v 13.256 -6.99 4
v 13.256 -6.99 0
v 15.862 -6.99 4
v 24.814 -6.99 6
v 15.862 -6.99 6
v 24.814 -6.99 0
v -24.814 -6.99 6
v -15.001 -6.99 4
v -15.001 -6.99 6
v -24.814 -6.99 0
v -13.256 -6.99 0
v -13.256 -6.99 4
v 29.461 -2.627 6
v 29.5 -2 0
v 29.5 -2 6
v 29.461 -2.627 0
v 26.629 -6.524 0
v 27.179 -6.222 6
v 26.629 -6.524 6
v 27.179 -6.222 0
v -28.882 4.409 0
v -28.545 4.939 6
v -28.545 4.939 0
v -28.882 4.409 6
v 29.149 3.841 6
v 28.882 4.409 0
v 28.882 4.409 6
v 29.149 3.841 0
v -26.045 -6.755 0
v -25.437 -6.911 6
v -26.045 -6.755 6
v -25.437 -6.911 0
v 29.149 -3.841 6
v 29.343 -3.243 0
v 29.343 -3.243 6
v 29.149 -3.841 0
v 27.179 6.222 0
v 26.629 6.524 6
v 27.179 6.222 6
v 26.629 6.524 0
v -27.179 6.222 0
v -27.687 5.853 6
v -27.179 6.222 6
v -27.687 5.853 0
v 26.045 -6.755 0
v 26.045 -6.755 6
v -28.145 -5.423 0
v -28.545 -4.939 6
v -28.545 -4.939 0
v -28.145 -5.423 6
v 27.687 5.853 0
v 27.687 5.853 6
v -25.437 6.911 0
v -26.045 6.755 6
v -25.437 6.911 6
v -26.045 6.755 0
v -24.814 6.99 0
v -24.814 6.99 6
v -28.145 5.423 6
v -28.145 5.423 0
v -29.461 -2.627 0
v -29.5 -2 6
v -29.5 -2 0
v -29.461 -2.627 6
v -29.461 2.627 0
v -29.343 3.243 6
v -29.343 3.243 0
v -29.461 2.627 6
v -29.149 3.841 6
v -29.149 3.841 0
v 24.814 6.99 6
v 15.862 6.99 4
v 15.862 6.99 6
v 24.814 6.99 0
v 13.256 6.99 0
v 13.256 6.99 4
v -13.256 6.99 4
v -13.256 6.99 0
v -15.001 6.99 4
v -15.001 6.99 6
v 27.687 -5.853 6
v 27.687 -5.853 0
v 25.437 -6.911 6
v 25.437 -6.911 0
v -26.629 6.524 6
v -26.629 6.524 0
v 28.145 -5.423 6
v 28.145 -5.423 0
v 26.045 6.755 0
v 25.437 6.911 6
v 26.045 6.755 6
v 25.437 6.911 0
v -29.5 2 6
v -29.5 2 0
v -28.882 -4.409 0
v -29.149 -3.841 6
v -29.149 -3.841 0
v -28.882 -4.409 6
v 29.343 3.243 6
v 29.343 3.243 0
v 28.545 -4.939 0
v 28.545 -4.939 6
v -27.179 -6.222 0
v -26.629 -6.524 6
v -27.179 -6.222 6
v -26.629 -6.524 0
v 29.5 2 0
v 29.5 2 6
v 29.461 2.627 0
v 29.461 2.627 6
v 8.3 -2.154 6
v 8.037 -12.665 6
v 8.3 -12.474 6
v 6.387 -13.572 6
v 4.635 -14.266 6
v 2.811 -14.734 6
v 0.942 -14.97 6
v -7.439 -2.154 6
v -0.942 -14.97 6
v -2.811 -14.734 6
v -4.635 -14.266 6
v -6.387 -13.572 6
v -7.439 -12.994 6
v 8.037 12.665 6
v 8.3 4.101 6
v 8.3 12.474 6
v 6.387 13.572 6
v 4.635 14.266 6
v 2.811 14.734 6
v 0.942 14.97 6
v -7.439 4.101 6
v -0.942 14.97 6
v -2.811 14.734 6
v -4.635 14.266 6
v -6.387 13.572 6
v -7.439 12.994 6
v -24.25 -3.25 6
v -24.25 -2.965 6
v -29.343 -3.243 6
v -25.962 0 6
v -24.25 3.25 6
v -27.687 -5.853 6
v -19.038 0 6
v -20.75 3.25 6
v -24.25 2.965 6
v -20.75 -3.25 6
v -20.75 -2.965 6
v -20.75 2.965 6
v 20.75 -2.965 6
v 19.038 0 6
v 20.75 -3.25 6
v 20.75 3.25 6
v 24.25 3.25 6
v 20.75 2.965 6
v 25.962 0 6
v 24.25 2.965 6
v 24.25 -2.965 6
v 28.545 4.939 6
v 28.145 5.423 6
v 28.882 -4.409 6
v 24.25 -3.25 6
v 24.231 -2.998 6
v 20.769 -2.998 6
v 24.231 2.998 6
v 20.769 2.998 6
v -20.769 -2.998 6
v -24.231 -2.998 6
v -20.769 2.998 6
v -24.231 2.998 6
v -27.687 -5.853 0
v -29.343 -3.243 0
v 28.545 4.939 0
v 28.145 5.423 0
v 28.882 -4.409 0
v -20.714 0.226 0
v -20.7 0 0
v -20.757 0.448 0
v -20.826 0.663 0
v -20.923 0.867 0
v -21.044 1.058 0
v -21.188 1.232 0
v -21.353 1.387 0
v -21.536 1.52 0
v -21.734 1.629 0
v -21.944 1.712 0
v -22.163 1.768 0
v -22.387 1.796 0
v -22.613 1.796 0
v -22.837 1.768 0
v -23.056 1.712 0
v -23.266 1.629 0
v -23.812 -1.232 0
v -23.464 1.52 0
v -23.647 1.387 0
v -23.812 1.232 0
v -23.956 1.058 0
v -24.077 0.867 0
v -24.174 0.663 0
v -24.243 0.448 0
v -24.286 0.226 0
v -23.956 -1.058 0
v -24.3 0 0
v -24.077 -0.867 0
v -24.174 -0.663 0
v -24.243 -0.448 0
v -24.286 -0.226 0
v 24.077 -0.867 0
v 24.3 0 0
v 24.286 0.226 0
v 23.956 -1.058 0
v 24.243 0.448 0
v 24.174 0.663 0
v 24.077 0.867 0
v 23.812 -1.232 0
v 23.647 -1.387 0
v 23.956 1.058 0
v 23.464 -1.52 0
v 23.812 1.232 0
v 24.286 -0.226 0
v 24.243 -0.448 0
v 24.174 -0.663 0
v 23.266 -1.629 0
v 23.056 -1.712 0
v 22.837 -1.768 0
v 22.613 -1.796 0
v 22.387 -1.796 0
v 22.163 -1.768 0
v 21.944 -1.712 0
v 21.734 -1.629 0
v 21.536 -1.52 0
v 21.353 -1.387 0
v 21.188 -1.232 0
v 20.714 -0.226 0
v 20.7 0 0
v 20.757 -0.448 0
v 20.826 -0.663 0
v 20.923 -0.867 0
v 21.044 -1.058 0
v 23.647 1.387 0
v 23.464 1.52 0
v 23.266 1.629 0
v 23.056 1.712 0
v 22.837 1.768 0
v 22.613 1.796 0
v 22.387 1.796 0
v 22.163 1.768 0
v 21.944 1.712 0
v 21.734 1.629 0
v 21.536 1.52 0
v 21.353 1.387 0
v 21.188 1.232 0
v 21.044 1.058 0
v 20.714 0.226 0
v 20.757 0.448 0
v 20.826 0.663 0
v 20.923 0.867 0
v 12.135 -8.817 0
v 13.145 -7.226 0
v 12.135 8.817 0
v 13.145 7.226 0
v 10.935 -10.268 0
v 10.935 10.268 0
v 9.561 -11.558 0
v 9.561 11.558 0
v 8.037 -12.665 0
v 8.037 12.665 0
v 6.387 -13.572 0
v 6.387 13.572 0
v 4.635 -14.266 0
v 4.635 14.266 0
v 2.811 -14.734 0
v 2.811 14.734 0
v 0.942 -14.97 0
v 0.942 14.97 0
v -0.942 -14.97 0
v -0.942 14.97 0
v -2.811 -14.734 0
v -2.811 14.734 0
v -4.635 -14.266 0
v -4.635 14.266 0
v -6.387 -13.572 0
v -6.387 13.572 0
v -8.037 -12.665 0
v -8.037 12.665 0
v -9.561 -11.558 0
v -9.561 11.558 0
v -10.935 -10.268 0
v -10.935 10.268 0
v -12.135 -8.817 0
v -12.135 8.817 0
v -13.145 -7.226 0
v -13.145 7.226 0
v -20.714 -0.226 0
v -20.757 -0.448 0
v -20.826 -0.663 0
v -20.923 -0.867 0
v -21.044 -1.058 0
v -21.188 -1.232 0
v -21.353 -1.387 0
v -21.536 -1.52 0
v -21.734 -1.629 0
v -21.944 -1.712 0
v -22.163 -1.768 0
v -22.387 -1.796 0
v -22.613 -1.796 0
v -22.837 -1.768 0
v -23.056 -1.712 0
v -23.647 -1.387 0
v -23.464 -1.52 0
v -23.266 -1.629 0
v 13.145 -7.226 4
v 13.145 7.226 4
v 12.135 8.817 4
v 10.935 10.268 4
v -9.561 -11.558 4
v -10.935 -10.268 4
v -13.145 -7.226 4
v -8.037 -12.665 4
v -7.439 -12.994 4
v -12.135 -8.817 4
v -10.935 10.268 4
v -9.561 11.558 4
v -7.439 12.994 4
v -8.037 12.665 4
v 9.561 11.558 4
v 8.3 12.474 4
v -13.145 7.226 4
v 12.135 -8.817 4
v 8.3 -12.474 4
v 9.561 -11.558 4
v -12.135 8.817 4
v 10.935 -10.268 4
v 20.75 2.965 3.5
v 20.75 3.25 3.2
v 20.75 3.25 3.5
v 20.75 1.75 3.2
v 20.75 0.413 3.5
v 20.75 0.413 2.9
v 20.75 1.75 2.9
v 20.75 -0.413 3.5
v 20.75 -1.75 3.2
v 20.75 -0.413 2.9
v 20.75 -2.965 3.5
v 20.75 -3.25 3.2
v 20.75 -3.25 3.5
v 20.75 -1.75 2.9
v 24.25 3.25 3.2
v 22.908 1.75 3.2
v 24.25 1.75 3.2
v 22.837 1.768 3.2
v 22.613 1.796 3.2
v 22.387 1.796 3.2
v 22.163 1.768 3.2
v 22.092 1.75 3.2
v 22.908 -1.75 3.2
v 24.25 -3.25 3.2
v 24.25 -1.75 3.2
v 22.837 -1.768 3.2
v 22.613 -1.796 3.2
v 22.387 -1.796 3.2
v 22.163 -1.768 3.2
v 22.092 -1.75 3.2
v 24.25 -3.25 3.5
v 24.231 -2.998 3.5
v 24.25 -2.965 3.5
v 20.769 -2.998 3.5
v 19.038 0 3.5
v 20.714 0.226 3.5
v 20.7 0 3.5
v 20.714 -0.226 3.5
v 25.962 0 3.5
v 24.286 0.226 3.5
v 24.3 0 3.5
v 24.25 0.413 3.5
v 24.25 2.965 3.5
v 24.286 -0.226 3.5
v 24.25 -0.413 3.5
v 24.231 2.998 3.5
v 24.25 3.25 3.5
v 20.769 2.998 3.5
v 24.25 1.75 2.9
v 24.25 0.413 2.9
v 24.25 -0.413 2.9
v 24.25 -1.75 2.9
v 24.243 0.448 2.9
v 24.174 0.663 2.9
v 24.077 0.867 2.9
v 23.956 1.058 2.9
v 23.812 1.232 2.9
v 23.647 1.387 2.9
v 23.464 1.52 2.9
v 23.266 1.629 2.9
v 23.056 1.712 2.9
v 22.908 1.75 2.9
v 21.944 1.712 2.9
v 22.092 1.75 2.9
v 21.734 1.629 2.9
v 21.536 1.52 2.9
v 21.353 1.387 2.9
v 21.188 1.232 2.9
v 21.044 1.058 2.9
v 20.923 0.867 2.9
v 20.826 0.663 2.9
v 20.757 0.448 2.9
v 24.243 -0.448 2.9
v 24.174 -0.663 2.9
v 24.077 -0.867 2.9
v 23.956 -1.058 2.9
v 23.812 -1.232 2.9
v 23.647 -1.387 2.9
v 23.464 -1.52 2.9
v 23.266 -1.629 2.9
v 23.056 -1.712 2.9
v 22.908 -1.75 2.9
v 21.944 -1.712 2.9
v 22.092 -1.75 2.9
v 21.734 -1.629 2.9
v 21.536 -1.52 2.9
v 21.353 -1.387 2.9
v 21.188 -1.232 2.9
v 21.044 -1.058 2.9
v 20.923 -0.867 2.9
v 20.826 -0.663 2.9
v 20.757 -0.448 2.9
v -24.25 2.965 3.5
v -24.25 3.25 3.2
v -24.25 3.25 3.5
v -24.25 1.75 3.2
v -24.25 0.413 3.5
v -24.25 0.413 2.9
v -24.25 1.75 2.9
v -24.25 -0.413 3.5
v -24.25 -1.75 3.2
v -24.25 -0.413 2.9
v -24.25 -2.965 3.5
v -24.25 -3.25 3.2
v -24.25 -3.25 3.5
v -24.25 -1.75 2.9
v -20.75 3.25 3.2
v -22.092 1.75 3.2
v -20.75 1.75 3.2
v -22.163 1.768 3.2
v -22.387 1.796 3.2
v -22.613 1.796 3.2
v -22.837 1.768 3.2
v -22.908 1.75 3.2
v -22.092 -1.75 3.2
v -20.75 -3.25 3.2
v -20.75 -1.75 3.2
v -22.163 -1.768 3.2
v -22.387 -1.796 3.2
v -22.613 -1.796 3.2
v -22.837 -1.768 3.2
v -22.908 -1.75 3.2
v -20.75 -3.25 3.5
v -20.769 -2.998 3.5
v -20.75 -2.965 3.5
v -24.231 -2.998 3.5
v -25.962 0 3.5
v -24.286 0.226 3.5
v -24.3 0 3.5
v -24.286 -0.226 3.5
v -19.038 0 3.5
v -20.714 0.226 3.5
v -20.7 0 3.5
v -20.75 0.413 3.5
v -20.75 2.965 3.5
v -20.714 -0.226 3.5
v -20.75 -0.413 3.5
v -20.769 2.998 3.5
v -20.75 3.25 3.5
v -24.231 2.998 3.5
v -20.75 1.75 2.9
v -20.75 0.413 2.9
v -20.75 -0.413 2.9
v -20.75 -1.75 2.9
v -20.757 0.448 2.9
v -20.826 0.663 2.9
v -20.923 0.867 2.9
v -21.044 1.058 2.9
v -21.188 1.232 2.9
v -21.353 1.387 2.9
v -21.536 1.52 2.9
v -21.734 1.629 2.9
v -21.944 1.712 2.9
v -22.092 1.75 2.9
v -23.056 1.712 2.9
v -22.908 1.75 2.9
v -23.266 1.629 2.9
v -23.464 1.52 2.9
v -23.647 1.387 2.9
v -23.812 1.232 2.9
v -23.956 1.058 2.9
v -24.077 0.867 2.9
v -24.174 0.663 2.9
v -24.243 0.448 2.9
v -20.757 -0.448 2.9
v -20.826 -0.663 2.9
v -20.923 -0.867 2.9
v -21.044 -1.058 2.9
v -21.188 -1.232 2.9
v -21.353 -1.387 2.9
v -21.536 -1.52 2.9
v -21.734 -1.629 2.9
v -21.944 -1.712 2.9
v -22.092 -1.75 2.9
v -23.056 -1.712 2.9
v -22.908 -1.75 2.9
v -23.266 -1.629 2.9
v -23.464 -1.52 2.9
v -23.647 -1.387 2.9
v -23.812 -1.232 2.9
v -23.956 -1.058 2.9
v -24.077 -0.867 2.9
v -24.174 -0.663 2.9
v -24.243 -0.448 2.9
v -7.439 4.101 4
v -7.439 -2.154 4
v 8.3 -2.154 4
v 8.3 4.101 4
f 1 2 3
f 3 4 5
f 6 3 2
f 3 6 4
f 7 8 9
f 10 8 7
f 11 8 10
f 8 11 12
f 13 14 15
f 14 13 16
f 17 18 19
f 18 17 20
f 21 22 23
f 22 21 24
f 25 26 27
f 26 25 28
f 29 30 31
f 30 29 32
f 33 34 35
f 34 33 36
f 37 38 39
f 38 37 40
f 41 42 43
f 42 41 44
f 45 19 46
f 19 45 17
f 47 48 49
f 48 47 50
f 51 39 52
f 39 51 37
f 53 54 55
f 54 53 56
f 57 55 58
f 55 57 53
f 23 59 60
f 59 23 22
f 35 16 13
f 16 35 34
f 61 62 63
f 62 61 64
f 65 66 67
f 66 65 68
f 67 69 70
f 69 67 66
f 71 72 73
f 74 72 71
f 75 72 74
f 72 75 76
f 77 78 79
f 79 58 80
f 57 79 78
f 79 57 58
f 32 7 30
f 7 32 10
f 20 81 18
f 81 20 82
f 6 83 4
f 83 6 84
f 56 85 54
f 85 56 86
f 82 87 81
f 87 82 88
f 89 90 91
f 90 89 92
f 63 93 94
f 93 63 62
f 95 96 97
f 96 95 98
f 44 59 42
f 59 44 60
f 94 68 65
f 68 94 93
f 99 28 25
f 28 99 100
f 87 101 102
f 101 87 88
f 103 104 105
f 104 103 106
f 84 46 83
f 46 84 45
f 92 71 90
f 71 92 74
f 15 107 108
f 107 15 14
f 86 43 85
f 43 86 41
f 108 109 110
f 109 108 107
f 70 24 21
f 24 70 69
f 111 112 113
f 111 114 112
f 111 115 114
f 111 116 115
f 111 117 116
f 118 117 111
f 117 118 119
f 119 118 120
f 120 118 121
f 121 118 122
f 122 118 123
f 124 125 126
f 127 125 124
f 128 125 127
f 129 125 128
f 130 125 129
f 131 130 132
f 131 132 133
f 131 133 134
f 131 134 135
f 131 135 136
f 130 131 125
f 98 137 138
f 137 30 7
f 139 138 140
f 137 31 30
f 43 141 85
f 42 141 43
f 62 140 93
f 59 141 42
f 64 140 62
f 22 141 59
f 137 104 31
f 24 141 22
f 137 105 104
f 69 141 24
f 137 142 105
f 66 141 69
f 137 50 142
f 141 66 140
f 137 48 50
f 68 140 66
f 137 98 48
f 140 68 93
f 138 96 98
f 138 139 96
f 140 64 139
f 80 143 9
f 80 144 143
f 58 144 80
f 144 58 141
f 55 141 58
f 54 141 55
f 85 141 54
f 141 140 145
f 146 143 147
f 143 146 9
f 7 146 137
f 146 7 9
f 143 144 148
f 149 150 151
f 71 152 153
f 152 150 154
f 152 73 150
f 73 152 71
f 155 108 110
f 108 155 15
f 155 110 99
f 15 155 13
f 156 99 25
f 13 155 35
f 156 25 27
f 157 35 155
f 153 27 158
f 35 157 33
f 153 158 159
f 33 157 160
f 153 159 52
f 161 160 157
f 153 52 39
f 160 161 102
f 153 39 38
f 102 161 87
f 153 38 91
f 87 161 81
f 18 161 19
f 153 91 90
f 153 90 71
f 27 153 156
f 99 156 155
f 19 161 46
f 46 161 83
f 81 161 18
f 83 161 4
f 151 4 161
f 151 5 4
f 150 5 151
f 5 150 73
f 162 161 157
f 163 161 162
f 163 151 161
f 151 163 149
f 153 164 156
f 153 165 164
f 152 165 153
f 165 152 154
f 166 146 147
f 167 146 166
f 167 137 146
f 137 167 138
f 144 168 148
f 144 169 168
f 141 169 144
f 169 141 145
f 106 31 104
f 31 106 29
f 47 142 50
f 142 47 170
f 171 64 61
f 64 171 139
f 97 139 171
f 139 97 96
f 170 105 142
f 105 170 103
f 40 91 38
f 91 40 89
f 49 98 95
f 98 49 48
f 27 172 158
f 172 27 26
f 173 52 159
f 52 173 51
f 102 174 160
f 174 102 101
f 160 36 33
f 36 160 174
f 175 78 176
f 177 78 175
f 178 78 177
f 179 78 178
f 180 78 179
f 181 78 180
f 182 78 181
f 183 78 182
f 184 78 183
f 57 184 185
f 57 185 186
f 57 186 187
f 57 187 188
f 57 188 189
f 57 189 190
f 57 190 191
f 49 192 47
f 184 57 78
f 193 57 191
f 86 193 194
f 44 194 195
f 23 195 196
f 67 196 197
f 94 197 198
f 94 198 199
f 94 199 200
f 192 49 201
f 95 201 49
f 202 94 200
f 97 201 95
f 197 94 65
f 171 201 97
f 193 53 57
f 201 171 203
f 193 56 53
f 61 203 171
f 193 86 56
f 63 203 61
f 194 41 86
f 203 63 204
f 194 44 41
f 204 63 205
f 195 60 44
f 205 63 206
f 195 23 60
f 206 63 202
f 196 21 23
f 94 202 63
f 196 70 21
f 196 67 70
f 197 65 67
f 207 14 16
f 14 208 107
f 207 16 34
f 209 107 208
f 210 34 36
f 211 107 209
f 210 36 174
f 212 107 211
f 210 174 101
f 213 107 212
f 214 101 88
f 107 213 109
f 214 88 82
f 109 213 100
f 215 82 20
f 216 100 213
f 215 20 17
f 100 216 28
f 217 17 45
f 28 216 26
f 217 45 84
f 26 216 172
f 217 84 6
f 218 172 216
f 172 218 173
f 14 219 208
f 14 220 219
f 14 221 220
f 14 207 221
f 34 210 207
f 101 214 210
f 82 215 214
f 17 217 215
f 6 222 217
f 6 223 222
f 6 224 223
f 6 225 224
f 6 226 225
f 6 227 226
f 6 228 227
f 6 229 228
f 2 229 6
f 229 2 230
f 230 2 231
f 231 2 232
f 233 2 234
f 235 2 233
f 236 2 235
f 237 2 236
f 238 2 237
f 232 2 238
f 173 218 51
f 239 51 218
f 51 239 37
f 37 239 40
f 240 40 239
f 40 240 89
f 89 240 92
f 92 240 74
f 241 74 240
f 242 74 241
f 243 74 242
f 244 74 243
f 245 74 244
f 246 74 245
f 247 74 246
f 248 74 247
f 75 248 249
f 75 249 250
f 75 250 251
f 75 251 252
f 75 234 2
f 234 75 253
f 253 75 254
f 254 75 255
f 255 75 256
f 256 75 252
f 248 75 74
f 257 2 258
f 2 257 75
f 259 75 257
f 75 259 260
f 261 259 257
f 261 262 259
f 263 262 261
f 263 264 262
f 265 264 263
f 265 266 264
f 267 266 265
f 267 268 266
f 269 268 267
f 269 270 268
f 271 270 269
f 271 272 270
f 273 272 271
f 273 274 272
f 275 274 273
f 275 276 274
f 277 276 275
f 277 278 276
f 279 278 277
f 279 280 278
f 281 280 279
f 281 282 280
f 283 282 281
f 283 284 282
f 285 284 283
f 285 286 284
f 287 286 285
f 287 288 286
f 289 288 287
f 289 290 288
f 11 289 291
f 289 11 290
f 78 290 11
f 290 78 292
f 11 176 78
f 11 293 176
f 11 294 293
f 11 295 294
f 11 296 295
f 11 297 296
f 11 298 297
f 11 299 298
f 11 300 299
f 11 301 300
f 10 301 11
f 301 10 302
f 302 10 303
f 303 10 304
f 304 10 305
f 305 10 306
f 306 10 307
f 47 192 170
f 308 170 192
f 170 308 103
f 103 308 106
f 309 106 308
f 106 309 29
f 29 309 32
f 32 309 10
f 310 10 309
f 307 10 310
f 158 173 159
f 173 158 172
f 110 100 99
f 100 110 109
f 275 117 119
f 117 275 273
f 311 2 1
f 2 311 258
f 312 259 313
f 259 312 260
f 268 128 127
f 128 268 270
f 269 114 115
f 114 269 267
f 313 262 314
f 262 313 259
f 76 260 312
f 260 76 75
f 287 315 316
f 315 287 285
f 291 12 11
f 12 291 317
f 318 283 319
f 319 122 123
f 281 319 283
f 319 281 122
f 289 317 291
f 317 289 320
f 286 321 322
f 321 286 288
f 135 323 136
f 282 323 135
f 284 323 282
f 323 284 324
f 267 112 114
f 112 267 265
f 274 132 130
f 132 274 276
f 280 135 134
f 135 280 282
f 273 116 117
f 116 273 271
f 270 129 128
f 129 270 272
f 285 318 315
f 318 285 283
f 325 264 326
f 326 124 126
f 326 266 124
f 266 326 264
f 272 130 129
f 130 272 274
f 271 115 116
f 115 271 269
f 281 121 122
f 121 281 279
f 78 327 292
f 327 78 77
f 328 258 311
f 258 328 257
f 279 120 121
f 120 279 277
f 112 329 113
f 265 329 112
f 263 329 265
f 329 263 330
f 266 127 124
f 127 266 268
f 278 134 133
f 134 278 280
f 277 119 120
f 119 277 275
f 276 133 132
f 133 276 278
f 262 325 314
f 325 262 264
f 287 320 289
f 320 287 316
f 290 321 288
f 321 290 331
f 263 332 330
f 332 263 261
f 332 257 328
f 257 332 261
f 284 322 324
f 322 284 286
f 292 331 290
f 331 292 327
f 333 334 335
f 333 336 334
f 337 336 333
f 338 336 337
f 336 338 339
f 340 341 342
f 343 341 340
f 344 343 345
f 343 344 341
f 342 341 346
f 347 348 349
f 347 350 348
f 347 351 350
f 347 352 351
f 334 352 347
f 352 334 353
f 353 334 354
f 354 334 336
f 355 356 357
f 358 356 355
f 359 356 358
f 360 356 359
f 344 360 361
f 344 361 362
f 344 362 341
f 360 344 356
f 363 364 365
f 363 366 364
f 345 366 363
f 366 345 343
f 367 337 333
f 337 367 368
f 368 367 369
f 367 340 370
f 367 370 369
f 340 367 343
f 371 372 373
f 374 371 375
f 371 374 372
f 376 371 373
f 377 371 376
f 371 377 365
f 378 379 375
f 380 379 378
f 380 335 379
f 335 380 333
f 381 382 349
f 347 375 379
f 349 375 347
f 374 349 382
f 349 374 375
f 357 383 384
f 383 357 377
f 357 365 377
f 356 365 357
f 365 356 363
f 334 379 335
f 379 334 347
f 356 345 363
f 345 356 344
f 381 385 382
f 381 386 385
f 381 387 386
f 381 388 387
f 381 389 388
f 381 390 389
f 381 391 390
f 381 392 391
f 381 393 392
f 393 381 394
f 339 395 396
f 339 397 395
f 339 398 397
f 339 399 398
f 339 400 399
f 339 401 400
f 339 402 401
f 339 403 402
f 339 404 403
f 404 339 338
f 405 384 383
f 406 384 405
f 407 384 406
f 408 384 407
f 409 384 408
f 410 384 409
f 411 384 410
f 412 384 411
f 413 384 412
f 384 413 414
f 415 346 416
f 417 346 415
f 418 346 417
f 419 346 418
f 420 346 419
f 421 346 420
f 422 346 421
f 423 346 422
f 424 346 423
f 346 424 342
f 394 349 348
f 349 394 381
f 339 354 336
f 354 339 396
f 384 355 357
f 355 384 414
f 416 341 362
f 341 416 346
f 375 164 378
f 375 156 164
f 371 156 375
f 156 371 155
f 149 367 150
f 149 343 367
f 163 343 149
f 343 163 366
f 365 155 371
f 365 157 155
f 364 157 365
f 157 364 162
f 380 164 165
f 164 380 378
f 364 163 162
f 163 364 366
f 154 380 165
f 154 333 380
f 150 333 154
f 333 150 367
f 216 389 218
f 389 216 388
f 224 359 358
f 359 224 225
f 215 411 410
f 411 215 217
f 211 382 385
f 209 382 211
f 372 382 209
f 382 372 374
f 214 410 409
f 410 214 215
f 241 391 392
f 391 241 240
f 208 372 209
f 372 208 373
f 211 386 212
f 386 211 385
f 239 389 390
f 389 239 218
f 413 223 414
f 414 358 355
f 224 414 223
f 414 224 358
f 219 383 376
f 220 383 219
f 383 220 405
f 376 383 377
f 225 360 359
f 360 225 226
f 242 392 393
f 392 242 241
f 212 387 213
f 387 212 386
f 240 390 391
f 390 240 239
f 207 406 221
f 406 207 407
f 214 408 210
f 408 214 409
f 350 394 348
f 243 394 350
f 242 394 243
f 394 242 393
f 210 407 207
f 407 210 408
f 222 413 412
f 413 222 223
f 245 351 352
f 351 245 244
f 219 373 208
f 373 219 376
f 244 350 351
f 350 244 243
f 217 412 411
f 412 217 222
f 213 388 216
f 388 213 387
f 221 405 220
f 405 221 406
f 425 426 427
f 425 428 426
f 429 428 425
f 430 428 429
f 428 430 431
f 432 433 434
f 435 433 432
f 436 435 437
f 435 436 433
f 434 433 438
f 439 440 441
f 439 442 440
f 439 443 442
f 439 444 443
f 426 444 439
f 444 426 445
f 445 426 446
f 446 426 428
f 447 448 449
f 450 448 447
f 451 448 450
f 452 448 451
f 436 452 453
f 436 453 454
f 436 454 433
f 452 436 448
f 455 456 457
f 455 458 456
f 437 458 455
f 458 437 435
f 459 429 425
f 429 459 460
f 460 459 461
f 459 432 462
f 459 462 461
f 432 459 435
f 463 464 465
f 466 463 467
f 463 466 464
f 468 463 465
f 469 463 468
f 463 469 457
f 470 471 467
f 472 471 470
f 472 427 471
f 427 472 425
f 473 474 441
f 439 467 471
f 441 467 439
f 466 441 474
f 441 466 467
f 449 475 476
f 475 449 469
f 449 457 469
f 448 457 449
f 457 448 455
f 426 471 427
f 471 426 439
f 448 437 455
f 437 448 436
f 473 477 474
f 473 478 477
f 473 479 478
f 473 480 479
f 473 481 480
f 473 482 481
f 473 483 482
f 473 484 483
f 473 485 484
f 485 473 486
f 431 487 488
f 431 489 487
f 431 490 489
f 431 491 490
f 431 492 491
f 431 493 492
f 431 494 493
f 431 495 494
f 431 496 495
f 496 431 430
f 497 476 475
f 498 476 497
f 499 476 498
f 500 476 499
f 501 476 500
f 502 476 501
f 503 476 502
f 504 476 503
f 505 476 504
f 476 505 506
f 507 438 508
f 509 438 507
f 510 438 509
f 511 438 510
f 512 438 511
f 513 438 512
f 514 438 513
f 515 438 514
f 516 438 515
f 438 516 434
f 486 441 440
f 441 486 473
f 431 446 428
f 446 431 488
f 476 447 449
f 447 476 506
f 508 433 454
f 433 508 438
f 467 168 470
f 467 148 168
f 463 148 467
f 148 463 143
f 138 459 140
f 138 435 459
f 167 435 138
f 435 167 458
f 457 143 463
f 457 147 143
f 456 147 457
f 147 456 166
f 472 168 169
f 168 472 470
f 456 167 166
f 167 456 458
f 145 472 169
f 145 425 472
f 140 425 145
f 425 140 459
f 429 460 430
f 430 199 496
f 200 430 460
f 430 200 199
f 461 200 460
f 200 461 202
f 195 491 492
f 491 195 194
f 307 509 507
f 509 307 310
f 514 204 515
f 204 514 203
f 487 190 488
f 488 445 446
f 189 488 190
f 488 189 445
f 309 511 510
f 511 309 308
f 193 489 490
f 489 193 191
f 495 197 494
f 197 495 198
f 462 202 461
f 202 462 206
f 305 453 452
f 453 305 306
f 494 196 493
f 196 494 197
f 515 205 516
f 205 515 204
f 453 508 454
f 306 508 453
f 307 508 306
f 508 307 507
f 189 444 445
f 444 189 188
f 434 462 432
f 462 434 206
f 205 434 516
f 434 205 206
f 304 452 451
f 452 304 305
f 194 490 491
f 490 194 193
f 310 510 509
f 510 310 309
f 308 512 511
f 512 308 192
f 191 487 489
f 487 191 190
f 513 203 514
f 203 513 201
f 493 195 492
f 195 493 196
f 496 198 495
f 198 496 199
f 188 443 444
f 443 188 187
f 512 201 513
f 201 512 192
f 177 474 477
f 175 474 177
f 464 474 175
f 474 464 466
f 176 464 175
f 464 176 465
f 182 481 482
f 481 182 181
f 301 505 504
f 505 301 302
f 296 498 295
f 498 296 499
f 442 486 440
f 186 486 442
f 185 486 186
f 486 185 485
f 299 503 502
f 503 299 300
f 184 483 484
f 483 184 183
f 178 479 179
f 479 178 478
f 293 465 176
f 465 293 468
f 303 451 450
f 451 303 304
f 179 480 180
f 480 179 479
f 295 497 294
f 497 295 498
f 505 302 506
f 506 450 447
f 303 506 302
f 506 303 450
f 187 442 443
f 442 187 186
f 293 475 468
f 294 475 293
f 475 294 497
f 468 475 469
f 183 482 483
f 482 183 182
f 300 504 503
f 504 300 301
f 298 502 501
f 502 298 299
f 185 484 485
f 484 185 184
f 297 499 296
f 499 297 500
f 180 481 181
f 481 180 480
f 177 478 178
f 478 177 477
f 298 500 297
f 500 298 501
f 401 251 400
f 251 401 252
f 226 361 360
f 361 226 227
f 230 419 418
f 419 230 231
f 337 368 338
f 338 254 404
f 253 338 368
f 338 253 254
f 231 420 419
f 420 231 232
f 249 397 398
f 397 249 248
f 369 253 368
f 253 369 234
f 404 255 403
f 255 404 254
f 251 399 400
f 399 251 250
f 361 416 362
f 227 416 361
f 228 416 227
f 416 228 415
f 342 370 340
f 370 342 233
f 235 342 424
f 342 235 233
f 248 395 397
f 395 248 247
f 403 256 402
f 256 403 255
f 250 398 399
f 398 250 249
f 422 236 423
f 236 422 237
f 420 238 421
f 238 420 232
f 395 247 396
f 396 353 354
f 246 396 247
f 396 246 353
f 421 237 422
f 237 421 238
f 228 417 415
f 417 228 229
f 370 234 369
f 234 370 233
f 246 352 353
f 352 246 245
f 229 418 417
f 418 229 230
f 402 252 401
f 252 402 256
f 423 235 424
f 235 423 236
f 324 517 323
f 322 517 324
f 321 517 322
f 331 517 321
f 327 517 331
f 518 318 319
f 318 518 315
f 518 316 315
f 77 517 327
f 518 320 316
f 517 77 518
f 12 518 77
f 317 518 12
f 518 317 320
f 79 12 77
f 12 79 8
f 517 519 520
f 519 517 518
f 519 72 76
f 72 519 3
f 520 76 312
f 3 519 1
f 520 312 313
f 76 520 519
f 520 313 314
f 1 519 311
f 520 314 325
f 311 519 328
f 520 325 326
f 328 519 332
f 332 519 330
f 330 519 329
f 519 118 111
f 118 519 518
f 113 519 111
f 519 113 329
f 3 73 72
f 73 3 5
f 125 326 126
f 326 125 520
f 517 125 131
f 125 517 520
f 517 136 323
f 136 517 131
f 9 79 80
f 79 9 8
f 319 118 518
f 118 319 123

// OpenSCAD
$fn = 50;


difference() {
	union() {
		hull() {
			translate(v = [-24.5000000000, 2.0000000000, 0]) {
				cylinder(h = 6, r = 5);
			}
			translate(v = [24.5000000000, 2.0000000000, 0]) {
				cylinder(h = 6, r = 5);
			}
			translate(v = [-24.5000000000, -2.0000000000, 0]) {
				cylinder(h = 6, r = 5);
			}
			translate(v = [24.5000000000, -2.0000000000, 0]) {
				cylinder(h = 6, r = 5);
			}
		}
		cylinder(h = 6, r = 15.0000000000);
	}
	union() {
		translate(v = [22.5000000000, 0, -20]) {
			rotate(a = [0, 180, 0]) {
				difference() {
					union() {
						translate(v = [0, 0, -26.0000000000]) {
							rotate(a = [0, 0, 0]) {
								difference() {
									union() {
										#translate(v = [-1.7500000000, -3.2500000000, -0.3000000000]) {
											cube(size = [3.5000000000, 6.5000000000, 0.3000000000]);
										}
										#translate(v = [-1.7500000000, -1.7500000000, -0.6000000000]) {
											cube(size = [3.5000000000, 3.5000000000, 0.3000000000]);
										}
										#translate(v = [-1.7500000000, -3.2500000000, 2.5000000000]) {
											cube(size = [3.5000000000, 6.5000000000, 0.3000000000]);
										}
										#translate(v = [-1.7500000000, -1.7500000000, 2.8000000000]) {
											cube(size = [3.5000000000, 3.5000000000, 0.3000000000]);
										}
										#linear_extrude(height = 2.5000000000) {
											polygon(points = [[3.4620000000, 0.0000000000], [1.7310000000, 2.9981799479], [-1.7310000000, 2.9981799479], [-3.4620000000, 0.0000000000], [-1.7310000000, -2.9981799479], [1.7310000000, -2.9981799479]]);
										}
										#translate(v = [-1.7500000000, -3.2500000000, -0.3000000000]) {
											cube(size = [3.5000000000, 6.5000000000, 0.3000000000]);
										}
										#translate(v = [-1.7500000000, -1.7500000000, -0.6000000000]) {
											cube(size = [3.5000000000, 3.5000000000, 0.3000000000]);
										}
										#translate(v = [-1.7500000000, -3.2500000000, 2.5000000000]) {
											cube(size = [3.5000000000, 6.5000000000, 0.3000000000]);
										}
										#translate(v = [-1.7500000000, -1.7500000000, 2.8000000000]) {
											cube(size = [3.5000000000, 3.5000000000, 0.3000000000]);
										}
										#translate(v = [-1.7500000000, -3.2500000000, -0.3000000000]) {
											cube(size = [3.5000000000, 6.5000000000, 0.3000000000]);
										}
										#translate(v = [-1.7500000000, -1.7500000000, -0.6000000000]) {
											cube(size = [3.5000000000, 3.5000000000, 0.3000000000]);
										}
										#translate(v = [-1.7500000000, -3.2500000000, 2.5000000000]) {
											cube(size = [3.5000000000, 6.5000000000, 0.3000000000]);
										}
										#translate(v = [-1.7500000000, -1.7500000000, 2.8000000000]) {
											cube(size = [3.5000000000, 3.5000000000, 0.3000000000]);
										}
									}
									union();
								}
							}
						}
						translate(v = [0, 0, -26.0000000000]) {
							rotate(a = [0, 0, 0]) {
								difference() {
									union() {
										#translate(v = [-1.7500000000, -3.2500000000, -0.3000000000]) {
											cube(size = [3.5000000000, 6.5000000000, 0.3000000000]);
										}
										#translate(v = [-1.7500000000, -1.7500000000, -0.6000000000]) {
											cube(size = [3.5000000000, 3.5000000000, 0.3000000000]);
										}
										#translate(v = [-1.7500000000, -3.2500000000, 2.5000000000]) {
											cube(size = [3.5000000000, 6.5000000000, 0.3000000000]);
										}
										#translate(v = [-1.7500000000, -1.7500000000, 2.8000000000]) {
											cube(size = [3.5000000000, 3.5000000000, 0.3000000000]);
										}
										#linear_extrude(height = 2.5000000000) {
											polygon(points = [[3.4620000000, 0.0000000000], [1.7310000000, 2.9981799479], [-1.7310000000, 2.9981799479], [-3.4620000000, 0.0000000000], [-1.7310000000, -2.9981799479], [1.7310000000, -2.9981799479]]);
										}
										#translate(v = [-1.7500000000, -3.2500000000, -0.3000000000]) {
											cube(size = [3.5000000000, 6.5000000000, 0.3000000000]);
										}
										#translate(v = [-1.7500000000, -1.7500000000, -0.6000000000]) {
											cube(size = [3.5000000000, 3.5000000000, 0.3000000000]);
										}
										#translate(v = [-1.7500000000, -3.2500000000, 2.5000000000]) {
											cube(size = [3.5000000000, 6.5000000000, 0.3000000000]);
										}
										#translate(v = [-1.7500000000, -1.7500000000, 2.8000000000]) {
											cube(size = [3.5000000000, 3.5000000000, 0.3000000000]);
										}
										#translate(v = [-1.7500000000, -3.2500000000, -0.3000000000]) {
											cube(size = [3.5000000000, 6.5000000000, 0.3000000000]);
										}
										#translate(v = [-1.7500000000, -1.7500000000, -0.6000000000]) {
											cube(size = [3.5000000000, 3.5000000000, 0.3000000000]);
										}
										#translate(v = [-1.7500000000, -3.2500000000, 2.5000000000]) {
											cube(size = [3.5000000000, 6.5000000000, 0.3000000000]);
										}
										#translate(v = [-1.7500000000, -1.7500000000, 2.8000000000]) {
											cube(size = [3.5000000000, 3.5000000000, 0.3000000000]);
										}
									}
									union();
								}
							}
						}
						translate(v = [0, 0, -26.0000000000]) {
							rotate(a = [0, 0, 0]) {
								difference() {
									union() {
										#translate(v = [-1.7500000000, -3.2500000000, -0.3000000000]) {
											cube(size = [3.5000000000, 6.5000000000, 0.3000000000]);
										}
										#translate(v = [-1.7500000000, -1.7500000000, -0.6000000000]) {
											cube(size = [3.5000000000, 3.5000000000, 0.3000000000]);
										}
										#translate(v = [-1.7500000000, -3.2500000000, 2.5000000000]) {
											cube(size = [3.5000000000, 6.5000000000, 0.3000000000]);
										}
										#translate(v = [-1.7500000000, -1.7500000000, 2.8000000000]) {
											cube(size = [3.5000000000, 3.5000000000, 0.3000000000]);
										}
										#linear_extrude(height = 2.5000000000) {
											polygon(points = [[3.4620000000, 0.0000000000], [1.7310000000, 2.9981799479], [-1.7310000000, 2.9981799479], [-3.4620000000, 0.0000000000], [-1.7310000000, -2.9981799479], [1.7310000000, -2.9981799479]]);
										}
										#translate(v = [-1.7500000000, -3.2500000000, -0.3000000000]) {
											cube(size = [3.5000000000, 6.5000000000, 0.3000000000]);
										}
										#translate(v = [-1.7500000000, -1.7500000000, -0.6000000000]) {
											cube(size = [3.5000000000, 3.5000000000, 0.3000000000]);
										}
										#translate(v = [-1.7500000000, -3.2500000000, 2.5000000000]) {
											cube(size = [3.5000000000, 6.5000000000, 0.3000000000]);
										}
										#translate(v = [-1.7500000000, -1.7500000000, 2.8000000000]) {
											cube(size = [3.5000000000, 3.5000000000, 0.3000000000]);
										}
										#translate(v = [-1.7500000000, -3.2500000000, -0.3000000000]) {
											cube(size = [3.5000000000, 6.5000000000, 0.3000000000]);
										}
										#translate(v = [-1.7500000000, -1.7500000000, -0.6000000000]) {
											cube(size = [3.5000000000, 3.5000000000, 0.3000000000]);
										}
										#translate(v = [-1.7500000000, -3.2500000000, 2.5000000000]) {
											cube(size = [3.5000000000, 6.5000000000, 0.3000000000]);
										}
										#translate(v = [-1.7500000000, -1.7500000000, 2.8000000000]) {
											cube(size = [3.5000000000, 3.5000000000, 0.3000000000]);
										}
									}
									union();
								}
							}
						}
						#translate(v = [0, 0, -26.0000000000]) {
							cylinder(h = 26, r = 1.5000000000);
						}
						#translate(v = [0, 0, -1.9000000000]) {
							cylinder(h = 1.9000000000, r1 = 1.8000000000, r2 = 3.6000000000);
						}
						#translate(v = [0, 0, -26.0000000000]) {
							cylinder(h = 26, r = 1.8000000000);
						}
						#translate(v = [0, 0, -26.0000000000]) {
							cylinder(h = 26, r = 1.5000000000);
						}
					}
					union();
				}
			}
		}
		translate(v = [-22.5000000000, 0, -20]) {
			rotate(a = [0, 180, 0]) {
				difference() {
					union() {
						translate(v = [0, 0, -26.0000000000]) {
							rotate(a = [0, 0, 0]) {
								difference() {
									union() {
										#translate(v = [-1.7500000000, -3.2500000000, -0.3000000000]) {
											cube(size = [3.5000000000, 6.5000000000, 0.3000000000]);
										}
										#translate(v = [-1.7500000000, -1.7500000000, -0.6000000000]) {
											cube(size = [3.5000000000, 3.5000000000, 0.3000000000]);
										}
										#translate(v = [-1.7500000000, -3.2500000000, 2.5000000000]) {
											cube(size = [3.5000000000, 6.5000000000, 0.3000000000]);
										}
										#translate(v = [-1.7500000000, -1.7500000000, 2.8000000000]) {
											cube(size = [3.5000000000, 3.5000000000, 0.3000000000]);
										}
										#linear_extrude(height = 2.5000000000) {
											polygon(points = [[3.4620000000, 0.0000000000], [1.7310000000, 2.9981799479], [-1.7310000000, 2.9981799479], [-3.4620000000, 0.0000000000], [-1.7310000000, -2.9981799479], [1.7310000000, -2.9981799479]]);
										}
										#translate(v = [-1.7500000000, -3.2500000000, -0.3000000000]) {
											cube(size = [3.5000000000, 6.5000000000, 0.3000000000]);
										}
										#translate(v = [-1.7500000000, -1.7500000000, -0.6000000000]) {
											cube(size = [3.5000000000, 3.5000000000, 0.3000000000]);
										}
										#translate(v = [-1.7500000000, -3.2500000000, 2.5000000000]) {
											cube(size = [3.5000000000, 6.5000000000, 0.3000000000]);
										}
										#translate(v = [-1.7500000000, -1.7500000000, 2.8000000000]) {
											cube(size = [3.5000000000, 3.5000000000, 0.3000000000]);
										}
										#translate(v = [-1.7500000000, -3.2500000000, -0.3000000000]) {
											cube(size = [3.5000000000, 6.5000000000, 0.3000000000]);
										}
										#translate(v = [-1.7500000000, -1.7500000000, -0.6000000000]) {
											cube(size = [3.5000000000, 3.5000000000, 0.3000000000]);
										}
										#translate(v = [-1.7500000000, -3.2500000000, 2.5000000000]) {
											cube(size = [3.5000000000, 6.5000000000, 0.3000000000]);
										}
										#translate(v = [-1.7500000000, -1.7500000000, 2.8000000000]) {
											cube(size = [3.5000000000, 3.5000000000, 0.3000000000]);
										}
									}
									union();
								}
							}
						}
						translate(v = [0, 0, -26.0000000000]) {
							rotate(a = [0, 0, 0]) {
								difference() {
									union() {
										#translate(v = [-1.7500000000, -3.2500000000, -0.3000000000]) {
											cube(size = [3.5000000000, 6.5000000000, 0.3000000000]);
										}
										#translate(v = [-1.7500000000, -1.7500000000, -0.6000000000]) {
											cube(size = [3.5000000000, 3.5000000000, 0.3000000000]);
										}
										#translate(v = [-1.7500000000, -3.2500000000, 2.5000000000]) {
											cube(size = [3.5000000000, 6.5000000000, 0.3000000000]);
										}
										#translate(v = [-1.7500000000, -1.7500000000, 2.8000000000]) {
											cube(size = [3.5000000000, 3.5000000000, 0.3000000000]);
										}
										#linear_extrude(height = 2.5000000000) {
											polygon(points = [[3.4620000000, 0.0000000000], [1.7310000000, 2.9981799479], [-1.7310000000, 2.9981799479], [-3.4620000000, 0.0000000000], [-1.7310000000, -2.9981799479], [1.7310000000, -2.9981799479]]);
										}
										#translate(v = [-1.7500000000, -3.2500000000, -0.3000000000]) {
											cube(size = [3.5000000000, 6.5000000000, 0.3000000000]);
										}
										#translate(v = [-1.7500000000, -1.7500000000, -0.6000000000]) {
											cube(size = [3.5000000000, 3.5000000000, 0.3000000000]);
										}
										#translate(v = [-1.7500000000, -3.2500000000, 2.5000000000]) {
											cube(size = [3.5000000000, 6.5000000000, 0.3000000000]);
										}
										#translate(v = [-1.7500000000, -1.7500000000, 2.8000000000]) {
											cube(size = [3.5000000000, 3.5000000000, 0.3000000000]);
										}
										#translate(v = [-1.7500000000, -3.2500000000, -0.3000000000]) {
											cube(size = [3.5000000000, 6.5000000000, 0.3000000000]);
										}
										#translate(v = [-1.7500000000, -1.7500000000, -0.6000000000]) {
											cube(size = [3.5000000000, 3.5000000000, 0.3000000000]);
										}
										#translate(v = [-1.7500000000, -3.2500000000, 2.5000000000]) {
											cube(size = [3.5000000000, 6.5000000000, 0.3000000000]);
										}
										#translate(v = [-1.7500000000, -1.7500000000, 2.8000000000]) {
											cube(size = [3.5000000000, 3.5000000000, 0.3000000000]);
										}
									}
									union();
								}
							}
						}
						translate(v = [0, 0, -26.0000000000]) {
							rotate(a = [0, 0, 0]) {
								difference() {
									union() {
										#translate(v = [-1.7500000000, -3.2500000000, -0.3000000000]) {
											cube(size = [3.5000000000, 6.5000000000, 0.3000000000]);
										}
										#translate(v = [-1.7500000000, -1.7500000000, -0.6000000000]) {
											cube(size = [3.5000000000, 3.5000000000, 0.3000000000]);
										}
										#translate(v = [-1.7500000000, -3.2500000000, 2.5000000000]) {
											cube(size = [3.5000000000, 6.5000000000, 0.3000000000]);
										}
										#translate(v = [-1.7500000000, -1.7500000000, 2.8000000000]) {
											cube(size = [3.5000000000, 3.5000000000, 0.3000000000]);
										}
										#linear_extrude(height = 2.5000000000) {
											polygon(points = [[3.4620000000, 0.0000000000], [1.7310000000, 2.9981799479], [-1.7310000000, 2.9981799479], [-3.4620000000, 0.0000000000], [-1.7310000000, -2.9981799479], [1.7310000000, -2.9981799479]]);
										}
										#translate(v = [-1.7500000000, -3.2500000000, -0.3000000000]) {
											cube(size = [3.5000000000, 6.5000000000, 0.3000000000]);
										}
										#translate(v = [-1.7500000000, -1.7500000000, -0.6000000000]) {
											cube(size = [3.5000000000, 3.5000000000, 0.3000000000]);
										}
										#translate(v = [-1.7500000000, -3.2500000000, 2.5000000000]) {
											cube(size = [3.5000000000, 6.5000000000, 0.3000000000]);
										}
										#translate(v = [-1.7500000000, -1.7500000000, 2.8000000000]) {
											cube(size = [3.5000000000, 3.5000000000, 0.3000000000]);
										}
										#translate(v = [-1.7500000000, -3.2500000000, -0.3000000000]) {
											cube(size = [3.5000000000, 6.5000000000, 0.3000000000]);
										}
										#translate(v = [-1.7500000000, -1.7500000000, -0.6000000000]) {
											cube(size = [3.5000000000, 3.5000000000, 0.3000000000]);
										}
										#translate(v = [-1.7500000000, -3.2500000000, 2.5000000000]) {
											cube(size = [3.5000000000, 6.5000000000, 0.3000000000]);
										}
										#translate(v = [-1.7500000000, -1.7500000000, 2.8000000000]) {
											cube(size = [3.5000000000, 3.5000000000, 0.3000000000]);
										}
									}
									union();
								}
							}
						}
						#translate(v = [0, 0, -26.0000000000]) {
							cylinder(h = 26, r = 1.5000000000);
						}
						#translate(v = [0, 0, -1.9000000000]) {
							cylinder(h = 1.9000000000, r1 = 1.8000000000, r2 = 3.6000000000);
						}
						#translate(v = [0, 0, -26.0000000000]) {
							cylinder(h = 26, r = 1.8000000000);
						}
						#translate(v = [0, 0, -26.0000000000]) {
							cylinder(h = 26, r = 1.5000000000);
						}
					}
					union();
				}
			}
		}
		translate(v = [-22.5000000000, 0.0000000000, 0]) {
			cylinder(h = 6, r = 1.8000000000);
		}
		translate(v = [22.5000000000, 0.0000000000, 0]) {
			cylinder(h = 6, r = 1.8000000000);
		}
		translate(v = [-22.5000000000, 0.0000000000, 0]) {
			cylinder(h = 6, r = 1.8000000000);
		}
		translate(v = [22.5000000000, 0.0000000000, 0]) {
			cylinder(h = 6, r = 1.8000000000);
		}
		translate(v = [-22.5000000000, 0.0000000000, 0]) {
			cylinder(h = 6, r = 1.8000000000);
		}
		translate(v = [22.5000000000, 0.0000000000, 0]) {
			cylinder(h = 6, r = 1.8000000000);
		}
		translate(v = [-22.5000000000, 0.0000000000, 0]) {
			cylinder(h = 6, r = 1.8000000000);
		}
		translate(v = [22.5000000000, 0.0000000000, 0]) {
			cylinder(h = 6, r = 1.8000000000);
		}
		#translate(v = [0, 0, 4]) {
			linear_extrude(height = 2) {
				text(font = "Arial:Bold", halign = "center", size = 37.8000000000, text = "H", valign = "center");
			}
		}
	}
}
